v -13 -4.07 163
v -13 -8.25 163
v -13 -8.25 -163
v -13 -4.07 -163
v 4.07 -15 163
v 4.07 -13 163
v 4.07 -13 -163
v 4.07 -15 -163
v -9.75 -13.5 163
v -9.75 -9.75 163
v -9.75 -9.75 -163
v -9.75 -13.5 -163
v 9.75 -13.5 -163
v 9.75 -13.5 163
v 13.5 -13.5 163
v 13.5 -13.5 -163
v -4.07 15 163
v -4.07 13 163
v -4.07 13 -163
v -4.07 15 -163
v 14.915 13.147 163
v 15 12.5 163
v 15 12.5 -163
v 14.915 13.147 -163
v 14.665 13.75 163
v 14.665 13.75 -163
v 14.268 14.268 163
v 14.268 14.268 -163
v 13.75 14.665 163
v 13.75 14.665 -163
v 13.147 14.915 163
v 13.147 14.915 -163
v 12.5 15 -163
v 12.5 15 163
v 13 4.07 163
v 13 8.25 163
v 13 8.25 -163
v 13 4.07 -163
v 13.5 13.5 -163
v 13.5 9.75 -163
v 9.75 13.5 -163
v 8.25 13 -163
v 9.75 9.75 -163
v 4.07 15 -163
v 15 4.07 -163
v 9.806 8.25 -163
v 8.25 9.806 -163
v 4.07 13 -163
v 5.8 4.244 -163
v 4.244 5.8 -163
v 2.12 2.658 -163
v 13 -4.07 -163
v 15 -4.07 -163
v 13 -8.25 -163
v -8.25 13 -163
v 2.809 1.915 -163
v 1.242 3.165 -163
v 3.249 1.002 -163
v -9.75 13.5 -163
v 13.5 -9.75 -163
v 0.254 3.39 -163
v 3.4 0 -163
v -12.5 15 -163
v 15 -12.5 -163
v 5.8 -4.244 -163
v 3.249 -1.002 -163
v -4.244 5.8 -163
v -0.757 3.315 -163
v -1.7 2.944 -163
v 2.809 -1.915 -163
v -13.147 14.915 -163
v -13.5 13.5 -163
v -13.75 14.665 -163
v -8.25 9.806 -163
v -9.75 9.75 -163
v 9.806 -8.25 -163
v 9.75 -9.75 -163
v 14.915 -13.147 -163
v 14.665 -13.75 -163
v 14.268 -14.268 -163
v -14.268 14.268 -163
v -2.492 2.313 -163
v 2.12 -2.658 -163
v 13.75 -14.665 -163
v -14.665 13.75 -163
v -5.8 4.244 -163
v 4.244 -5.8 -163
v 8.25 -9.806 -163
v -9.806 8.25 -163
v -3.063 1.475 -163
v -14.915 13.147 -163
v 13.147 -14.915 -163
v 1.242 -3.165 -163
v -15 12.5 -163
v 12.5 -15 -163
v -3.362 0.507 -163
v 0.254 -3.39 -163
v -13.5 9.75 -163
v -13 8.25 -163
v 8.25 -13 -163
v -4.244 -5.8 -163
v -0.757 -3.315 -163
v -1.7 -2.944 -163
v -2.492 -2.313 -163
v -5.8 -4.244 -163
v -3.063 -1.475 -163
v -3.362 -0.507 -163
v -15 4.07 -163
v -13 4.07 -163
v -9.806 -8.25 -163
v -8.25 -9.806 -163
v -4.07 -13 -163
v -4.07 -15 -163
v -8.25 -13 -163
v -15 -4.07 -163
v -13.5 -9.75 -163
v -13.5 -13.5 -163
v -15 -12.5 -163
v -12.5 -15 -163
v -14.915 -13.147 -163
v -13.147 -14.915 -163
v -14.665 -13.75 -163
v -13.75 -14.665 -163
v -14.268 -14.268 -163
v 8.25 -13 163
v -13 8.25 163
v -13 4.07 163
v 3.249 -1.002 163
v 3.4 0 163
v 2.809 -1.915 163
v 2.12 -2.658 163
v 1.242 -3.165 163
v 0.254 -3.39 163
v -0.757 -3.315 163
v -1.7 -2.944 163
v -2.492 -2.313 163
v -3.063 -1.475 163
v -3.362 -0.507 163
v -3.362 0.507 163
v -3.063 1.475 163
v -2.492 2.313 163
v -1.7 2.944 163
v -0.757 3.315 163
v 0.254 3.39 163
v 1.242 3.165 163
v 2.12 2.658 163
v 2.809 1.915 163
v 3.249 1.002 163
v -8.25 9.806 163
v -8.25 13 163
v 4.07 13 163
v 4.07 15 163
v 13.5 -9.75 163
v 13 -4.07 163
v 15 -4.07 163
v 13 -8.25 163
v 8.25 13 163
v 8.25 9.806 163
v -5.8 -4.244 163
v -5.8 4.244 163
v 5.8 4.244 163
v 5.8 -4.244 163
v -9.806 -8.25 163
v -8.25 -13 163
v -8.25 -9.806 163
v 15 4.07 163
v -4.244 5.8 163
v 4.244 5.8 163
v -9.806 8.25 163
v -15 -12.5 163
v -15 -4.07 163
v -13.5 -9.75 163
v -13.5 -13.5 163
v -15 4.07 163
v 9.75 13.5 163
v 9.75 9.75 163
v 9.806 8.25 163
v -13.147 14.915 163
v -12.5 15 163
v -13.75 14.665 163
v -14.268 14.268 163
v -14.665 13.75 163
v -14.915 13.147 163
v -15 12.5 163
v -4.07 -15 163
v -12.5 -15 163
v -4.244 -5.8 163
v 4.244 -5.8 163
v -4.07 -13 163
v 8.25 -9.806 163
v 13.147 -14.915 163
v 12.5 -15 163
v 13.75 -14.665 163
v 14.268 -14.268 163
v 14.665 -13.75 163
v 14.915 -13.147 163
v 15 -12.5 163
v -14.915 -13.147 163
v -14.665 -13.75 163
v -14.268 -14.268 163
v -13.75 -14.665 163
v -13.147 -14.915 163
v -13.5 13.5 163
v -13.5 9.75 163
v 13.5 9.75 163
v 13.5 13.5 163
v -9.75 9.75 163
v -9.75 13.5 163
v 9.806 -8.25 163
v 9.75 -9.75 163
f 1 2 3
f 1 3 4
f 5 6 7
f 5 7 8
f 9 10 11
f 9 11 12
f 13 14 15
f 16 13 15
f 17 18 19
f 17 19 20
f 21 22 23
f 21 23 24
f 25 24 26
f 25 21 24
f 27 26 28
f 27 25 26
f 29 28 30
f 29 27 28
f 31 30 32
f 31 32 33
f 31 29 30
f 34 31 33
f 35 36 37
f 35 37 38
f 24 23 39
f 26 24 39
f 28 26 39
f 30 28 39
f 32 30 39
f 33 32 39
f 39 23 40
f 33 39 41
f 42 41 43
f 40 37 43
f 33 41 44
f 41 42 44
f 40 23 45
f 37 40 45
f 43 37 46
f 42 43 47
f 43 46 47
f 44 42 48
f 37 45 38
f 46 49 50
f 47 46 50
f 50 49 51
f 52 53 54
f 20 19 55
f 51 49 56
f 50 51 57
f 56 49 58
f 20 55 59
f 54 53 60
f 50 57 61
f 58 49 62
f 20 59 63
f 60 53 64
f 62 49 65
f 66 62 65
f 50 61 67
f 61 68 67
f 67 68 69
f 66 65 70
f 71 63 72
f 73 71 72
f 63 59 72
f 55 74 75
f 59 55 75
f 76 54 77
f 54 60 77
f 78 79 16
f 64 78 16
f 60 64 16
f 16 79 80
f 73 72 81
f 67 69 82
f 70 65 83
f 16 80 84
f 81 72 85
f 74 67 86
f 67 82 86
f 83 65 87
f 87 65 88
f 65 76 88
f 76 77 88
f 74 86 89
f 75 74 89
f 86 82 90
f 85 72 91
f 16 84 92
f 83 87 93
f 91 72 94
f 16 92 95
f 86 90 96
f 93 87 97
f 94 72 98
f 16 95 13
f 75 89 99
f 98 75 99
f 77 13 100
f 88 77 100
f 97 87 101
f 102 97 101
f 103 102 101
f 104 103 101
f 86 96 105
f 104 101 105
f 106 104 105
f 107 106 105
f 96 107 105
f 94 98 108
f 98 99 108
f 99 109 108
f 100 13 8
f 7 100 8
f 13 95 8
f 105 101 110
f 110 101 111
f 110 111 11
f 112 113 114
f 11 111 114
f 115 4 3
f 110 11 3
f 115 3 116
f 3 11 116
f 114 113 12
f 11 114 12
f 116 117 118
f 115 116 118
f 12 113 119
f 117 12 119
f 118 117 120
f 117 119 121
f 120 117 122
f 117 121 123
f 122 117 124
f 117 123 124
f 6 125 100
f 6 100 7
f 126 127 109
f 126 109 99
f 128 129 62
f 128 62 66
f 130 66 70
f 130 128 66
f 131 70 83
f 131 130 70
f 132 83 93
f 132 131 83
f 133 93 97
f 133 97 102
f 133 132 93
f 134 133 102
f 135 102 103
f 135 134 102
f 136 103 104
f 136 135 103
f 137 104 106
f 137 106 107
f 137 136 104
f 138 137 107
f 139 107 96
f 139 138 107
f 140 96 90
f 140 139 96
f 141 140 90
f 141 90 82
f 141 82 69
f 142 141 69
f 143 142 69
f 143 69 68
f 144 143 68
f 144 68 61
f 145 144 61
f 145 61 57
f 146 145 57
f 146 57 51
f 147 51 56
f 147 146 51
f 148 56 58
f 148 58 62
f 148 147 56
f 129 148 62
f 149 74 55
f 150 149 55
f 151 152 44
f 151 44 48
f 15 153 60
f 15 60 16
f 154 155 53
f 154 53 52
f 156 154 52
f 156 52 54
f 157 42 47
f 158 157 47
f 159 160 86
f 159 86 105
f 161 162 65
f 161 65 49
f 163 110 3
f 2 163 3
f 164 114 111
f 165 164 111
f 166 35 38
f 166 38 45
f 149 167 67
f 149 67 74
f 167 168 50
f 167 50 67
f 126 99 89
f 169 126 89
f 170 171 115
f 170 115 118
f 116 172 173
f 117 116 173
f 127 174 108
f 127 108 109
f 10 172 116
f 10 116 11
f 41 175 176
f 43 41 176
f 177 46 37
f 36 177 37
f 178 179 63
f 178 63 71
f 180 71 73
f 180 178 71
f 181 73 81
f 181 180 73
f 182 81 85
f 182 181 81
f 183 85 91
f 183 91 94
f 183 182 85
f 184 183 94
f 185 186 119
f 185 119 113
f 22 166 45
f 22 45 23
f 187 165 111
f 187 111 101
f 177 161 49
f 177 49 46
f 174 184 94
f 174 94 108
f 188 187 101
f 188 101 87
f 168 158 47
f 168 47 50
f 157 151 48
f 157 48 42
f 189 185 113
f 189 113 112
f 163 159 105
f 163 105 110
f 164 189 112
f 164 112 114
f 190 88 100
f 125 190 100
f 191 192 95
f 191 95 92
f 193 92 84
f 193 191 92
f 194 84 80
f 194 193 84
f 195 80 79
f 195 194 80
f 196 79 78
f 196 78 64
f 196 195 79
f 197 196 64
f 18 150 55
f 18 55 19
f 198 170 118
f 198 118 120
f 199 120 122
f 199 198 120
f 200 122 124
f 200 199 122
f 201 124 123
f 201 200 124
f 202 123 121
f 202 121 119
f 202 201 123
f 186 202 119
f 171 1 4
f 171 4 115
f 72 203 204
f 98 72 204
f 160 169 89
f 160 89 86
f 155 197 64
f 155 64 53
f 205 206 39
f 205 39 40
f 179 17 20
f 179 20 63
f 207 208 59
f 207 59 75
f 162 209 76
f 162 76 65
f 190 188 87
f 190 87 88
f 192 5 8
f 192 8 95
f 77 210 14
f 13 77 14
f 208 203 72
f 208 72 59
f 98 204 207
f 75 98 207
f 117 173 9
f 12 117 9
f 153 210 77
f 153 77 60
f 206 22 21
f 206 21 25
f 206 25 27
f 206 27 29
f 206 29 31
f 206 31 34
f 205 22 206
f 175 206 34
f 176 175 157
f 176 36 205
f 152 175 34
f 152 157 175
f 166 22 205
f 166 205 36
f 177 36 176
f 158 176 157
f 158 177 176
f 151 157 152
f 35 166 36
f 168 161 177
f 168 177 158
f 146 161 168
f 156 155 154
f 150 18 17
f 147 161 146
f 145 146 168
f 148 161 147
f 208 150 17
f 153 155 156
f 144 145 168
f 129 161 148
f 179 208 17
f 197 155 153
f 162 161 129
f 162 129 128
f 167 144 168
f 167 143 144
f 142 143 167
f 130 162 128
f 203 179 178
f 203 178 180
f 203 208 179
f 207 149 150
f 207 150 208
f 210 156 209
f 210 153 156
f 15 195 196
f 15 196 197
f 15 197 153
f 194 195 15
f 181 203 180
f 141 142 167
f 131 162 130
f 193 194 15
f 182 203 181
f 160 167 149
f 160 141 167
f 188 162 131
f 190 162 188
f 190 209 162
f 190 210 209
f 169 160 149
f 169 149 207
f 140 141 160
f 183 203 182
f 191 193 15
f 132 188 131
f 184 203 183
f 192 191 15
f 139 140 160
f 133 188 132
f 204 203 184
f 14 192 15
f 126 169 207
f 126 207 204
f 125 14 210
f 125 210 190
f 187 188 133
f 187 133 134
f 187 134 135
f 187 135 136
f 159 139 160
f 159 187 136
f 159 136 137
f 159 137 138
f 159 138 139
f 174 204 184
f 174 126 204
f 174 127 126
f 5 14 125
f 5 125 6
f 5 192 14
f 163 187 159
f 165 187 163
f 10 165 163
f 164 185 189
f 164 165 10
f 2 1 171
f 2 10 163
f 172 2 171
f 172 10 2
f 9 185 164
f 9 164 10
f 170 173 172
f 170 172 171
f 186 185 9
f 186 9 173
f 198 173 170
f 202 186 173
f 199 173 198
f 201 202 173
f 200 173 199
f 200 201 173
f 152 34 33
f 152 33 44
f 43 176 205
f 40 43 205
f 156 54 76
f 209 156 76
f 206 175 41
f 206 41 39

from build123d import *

# Parameters (mm, degrees)
SKETCH11_R                          = 3.4
SKETCH11_W                          = 3.75
SKETCH11_H                          = 3.75
F_3030_3030_PROFILE_ZYLTECH_1_DEPTH = 325.999796


with BuildPart() as part:
    # Sketch11 → 3030 3030 PROFILE ZYLTECH(1) (new body)
    with BuildSketch(Plane(origin=(0, 0, 162.999898), x_dir=(1, 0, 0), z_dir=(0, 0, -1))):
        with BuildLine():
            Line((-9.805634919, -8.25), (-5.8, -4.244365081))
            Line((-5.8, -4.244365081), (-5.8, 4.244365081))
            Line((-5.8, 4.244365081), (-9.805634919, 8.25))
            Line((-9.805634919, 8.25), (-13, 8.25))
            Line((-13, 8.25), (-13, 4.07))
            Line((-13, 4.07), (-15, 4.07))
            Line((-15, 4.07), (-15, 12.5))
            ThreePointArc((-15, 12.5), (-14.267766953, 14.267766953), (-12.5, 15))
            Line((-12.5, 15), (-4.07, 15))
            Line((-4.07, 15), (-4.07, 13))
            Line((-4.07, 13), (-8.25, 13))
            Line((-8.25, 13), (-8.25, 9.805634919))
            Line((-8.25, 9.805634919), (-4.244365081, 5.8))
            Line((-4.244365081, 5.8), (4.244365081, 5.8))
            Line((4.244365081, 5.8), (8.25, 9.805634919))
            Line((8.25, 9.805634919), (8.25, 13))
            Line((8.25, 13), (4.07, 13))
            Line((4.07, 13), (4.07, 15))
            Line((4.07, 15), (12.5, 15))
            ThreePointArc((12.5, 15), (14.267766953, 14.267766953), (15, 12.5))
            Line((15, 12.5), (15, 4.07))
            Line((15, 4.07), (13, 4.07))
            Line((13, 4.07), (13, 8.25))
            Line((13, 8.25), (9.805634919, 8.25))
            Line((9.805634919, 8.25), (5.8, 4.244365081))
            Line((5.8, 4.244365081), (5.8, -4.244365081))
            Line((5.8, -4.244365081), (9.805634919, -8.25))
            Line((9.805634919, -8.25), (13, -8.25))
            Line((13, -8.25), (13, -4.07))
            Line((13, -4.07), (15, -4.07))
            Line((15, -4.07), (15, -12.5))
            ThreePointArc((15, -12.5), (14.267766953, -14.267766953), (12.5, -15))
            Line((12.5, -15), (4.07, -15))
            Line((4.07, -15), (4.07, -13))
            Line((4.07, -13), (8.25, -13))
            Line((8.25, -13), (8.25, -9.805634919))
            Line((8.25, -9.805634919), (4.244365081, -5.8))
            Line((4.244365081, -5.8), (-4.244365081, -5.8))
            Line((-4.244365081, -5.8), (-8.25, -9.805634919))
            Line((-8.25, -9.805634919), (-8.25, -13))
            Line((-8.25, -13), (-4.07, -13))
            Line((-4.07, -13), (-4.07, -15))
            Line((-4.07, -15), (-12.5, -15))
            ThreePointArc((-12.5, -15), (-14.267766953, -14.267766953), (-15, -12.5))
            Line((-15, -12.5), (-15, -4.07))
            Line((-15, -4.07), (-13, -4.07))
            Line((-13, -4.07), (-13, -8.25))
            Line((-13, -8.25), (-9.805634919, -8.25))
        make_face()
        Circle(SKETCH11_R, mode=Mode.SUBTRACT)
        with Locations((-11.625, 11.625)):
            Rectangle(SKETCH11_W, SKETCH11_H, mode=Mode.SUBTRACT)
        with Locations((11.625, 11.625)):
            Rectangle(SKETCH11_W, SKETCH11_H, mode=Mode.SUBTRACT)
        with Locations((-11.625, -11.625)):
            Rectangle(SKETCH11_W, SKETCH11_H, mode=Mode.SUBTRACT)
        with Locations((11.625, -11.625)):
            Rectangle(SKETCH11_W, SKETCH11_H, mode=Mode.SUBTRACT)
    extrude(amount=F_3030_3030_PROFILE_ZYLTECH_1_DEPTH)


solid = part.part
